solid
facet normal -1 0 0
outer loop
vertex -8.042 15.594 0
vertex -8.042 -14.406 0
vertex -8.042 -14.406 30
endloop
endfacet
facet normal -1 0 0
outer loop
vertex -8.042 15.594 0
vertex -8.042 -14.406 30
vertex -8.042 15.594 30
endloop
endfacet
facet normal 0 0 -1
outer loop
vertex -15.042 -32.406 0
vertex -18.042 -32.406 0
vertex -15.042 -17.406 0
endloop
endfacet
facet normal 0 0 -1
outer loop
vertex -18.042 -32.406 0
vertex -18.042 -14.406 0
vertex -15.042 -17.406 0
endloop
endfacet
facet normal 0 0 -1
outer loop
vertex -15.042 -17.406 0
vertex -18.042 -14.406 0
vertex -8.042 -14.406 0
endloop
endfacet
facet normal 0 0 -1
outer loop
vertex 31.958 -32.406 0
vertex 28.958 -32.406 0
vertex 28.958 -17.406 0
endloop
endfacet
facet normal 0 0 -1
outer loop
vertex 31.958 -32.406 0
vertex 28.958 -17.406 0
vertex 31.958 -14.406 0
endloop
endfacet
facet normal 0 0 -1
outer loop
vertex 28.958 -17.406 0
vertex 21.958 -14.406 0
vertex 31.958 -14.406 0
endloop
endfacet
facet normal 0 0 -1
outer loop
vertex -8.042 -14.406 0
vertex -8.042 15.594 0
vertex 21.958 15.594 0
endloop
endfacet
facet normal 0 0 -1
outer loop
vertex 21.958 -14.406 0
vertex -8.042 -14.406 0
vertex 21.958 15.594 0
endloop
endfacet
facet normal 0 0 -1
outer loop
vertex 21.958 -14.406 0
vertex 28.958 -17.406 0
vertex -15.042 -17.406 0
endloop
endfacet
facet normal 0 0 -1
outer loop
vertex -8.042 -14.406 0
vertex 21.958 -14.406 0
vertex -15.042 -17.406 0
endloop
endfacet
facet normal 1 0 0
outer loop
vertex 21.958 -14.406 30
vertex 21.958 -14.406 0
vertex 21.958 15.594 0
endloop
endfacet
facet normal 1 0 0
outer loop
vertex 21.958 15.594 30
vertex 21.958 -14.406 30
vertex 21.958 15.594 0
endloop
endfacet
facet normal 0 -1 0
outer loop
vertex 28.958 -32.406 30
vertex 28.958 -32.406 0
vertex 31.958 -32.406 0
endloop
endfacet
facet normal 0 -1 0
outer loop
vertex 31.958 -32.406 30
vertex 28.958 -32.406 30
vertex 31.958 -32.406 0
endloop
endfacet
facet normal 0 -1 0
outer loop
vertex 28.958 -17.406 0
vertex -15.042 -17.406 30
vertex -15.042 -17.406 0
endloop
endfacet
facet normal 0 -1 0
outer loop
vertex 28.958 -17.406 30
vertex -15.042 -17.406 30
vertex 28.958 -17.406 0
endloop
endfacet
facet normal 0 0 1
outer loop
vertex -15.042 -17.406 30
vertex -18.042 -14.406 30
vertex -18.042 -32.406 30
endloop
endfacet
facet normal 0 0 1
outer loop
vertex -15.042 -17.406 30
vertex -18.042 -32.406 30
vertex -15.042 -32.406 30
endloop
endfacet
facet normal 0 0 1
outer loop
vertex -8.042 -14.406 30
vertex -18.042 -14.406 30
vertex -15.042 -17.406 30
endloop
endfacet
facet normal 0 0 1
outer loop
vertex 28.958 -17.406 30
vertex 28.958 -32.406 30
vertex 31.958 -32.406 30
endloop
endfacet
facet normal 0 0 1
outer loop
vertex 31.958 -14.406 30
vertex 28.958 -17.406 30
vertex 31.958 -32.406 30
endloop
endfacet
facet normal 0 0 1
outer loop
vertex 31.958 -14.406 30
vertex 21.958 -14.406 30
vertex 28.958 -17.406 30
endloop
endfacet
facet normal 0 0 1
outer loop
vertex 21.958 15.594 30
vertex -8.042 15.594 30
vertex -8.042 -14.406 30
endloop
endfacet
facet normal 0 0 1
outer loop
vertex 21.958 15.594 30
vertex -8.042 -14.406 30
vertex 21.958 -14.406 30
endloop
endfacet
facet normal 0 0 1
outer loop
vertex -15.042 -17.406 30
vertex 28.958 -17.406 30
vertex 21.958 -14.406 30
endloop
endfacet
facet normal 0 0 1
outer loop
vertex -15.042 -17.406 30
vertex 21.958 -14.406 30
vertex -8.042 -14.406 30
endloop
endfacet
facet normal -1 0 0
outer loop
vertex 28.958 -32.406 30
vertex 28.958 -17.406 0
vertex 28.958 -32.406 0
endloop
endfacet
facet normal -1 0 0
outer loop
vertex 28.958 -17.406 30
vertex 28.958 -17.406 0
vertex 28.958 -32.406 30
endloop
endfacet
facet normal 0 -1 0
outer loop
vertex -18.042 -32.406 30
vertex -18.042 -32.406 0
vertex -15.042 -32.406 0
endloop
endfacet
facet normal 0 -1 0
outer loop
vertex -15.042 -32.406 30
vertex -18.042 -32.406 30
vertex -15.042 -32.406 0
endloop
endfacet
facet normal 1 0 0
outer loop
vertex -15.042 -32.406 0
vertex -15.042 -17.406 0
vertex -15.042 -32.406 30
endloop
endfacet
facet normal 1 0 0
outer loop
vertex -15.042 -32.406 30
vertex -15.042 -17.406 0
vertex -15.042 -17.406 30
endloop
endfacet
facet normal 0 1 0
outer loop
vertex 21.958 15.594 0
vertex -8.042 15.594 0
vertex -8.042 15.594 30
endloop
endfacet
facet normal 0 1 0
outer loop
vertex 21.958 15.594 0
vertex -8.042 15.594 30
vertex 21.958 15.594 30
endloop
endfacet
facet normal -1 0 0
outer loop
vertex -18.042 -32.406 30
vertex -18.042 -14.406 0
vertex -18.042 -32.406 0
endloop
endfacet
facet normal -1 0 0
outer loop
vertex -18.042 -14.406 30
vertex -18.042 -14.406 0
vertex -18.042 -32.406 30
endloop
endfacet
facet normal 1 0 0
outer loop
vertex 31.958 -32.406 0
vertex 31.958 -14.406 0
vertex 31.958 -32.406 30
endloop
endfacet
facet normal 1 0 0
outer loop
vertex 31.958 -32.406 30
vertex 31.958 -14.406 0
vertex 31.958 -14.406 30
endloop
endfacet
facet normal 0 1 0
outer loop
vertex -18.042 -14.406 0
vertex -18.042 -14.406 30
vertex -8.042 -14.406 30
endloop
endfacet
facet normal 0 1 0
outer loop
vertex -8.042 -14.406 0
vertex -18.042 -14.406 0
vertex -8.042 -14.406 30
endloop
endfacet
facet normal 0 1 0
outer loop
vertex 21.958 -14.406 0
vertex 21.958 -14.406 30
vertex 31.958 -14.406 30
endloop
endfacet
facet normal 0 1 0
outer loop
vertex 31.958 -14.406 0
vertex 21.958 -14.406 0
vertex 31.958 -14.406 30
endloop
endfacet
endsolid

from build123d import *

# Parameters (mm, degrees)
SKETCH_1_W          = 30
SKETCH_1_H          = 30
EXTRUDE_1_DEPTH     = 30
SKETCH_2_W          = 50
SKETCH_2_H          = 40
EXTRUDE_2_DEPTH     = 3
SKETCH_3_W          = 3
SKETCH_3_H          = 40
EXTRUDE_3_DEPTH     = 15
SKETCH_4_W          = 50.744831967
SKETCH_4_H          = 10
CUT_EXTRUDE_1_DEPTH = 19


with BuildPart() as part:
    # 草图1 → 凸台-拉伸1 (new body)
    with BuildSketch(Plane.XY):
        with Locations((6.958041958, 0.594405594)):
            Rectangle(SKETCH_1_W, SKETCH_1_H)
    extrude(amount=EXTRUDE_1_DEPTH)

    # 草图2 → 凸台-拉伸2 (add)
    with BuildSketch(Plane.XZ.offset(14.405594406)):
        with Locations((6.958041958, 20)):
            Rectangle(SKETCH_2_W, SKETCH_2_H)
    extrude(amount=EXTRUDE_2_DEPTH)

    # 草图3 → 凸台-拉伸3 (add)
    with BuildSketch(Plane.XZ.offset(17.405594406)):
        with Locations((-16.541958042, 20)):
            Rectangle(SKETCH_3_W, SKETCH_3_H)
        with Locations((30.458041958, 20)):
            Rectangle(SKETCH_3_W, SKETCH_3_H)
    extrude(amount=EXTRUDE_3_DEPTH)

    # 草图4 → 切除-拉伸1 (cut, through all)
    with BuildSketch(Plane(origin=(0, -14.405594406, 0), x_dir=(1, 0, 0), z_dir=(0, 1, 0))):
        with Locations((6.585625975, -35)):
            Rectangle(SKETCH_4_W, SKETCH_4_H)
    extrude(amount=-CUT_EXTRUDE_1_DEPTH, mode=Mode.SUBTRACT)


solid = part.part
